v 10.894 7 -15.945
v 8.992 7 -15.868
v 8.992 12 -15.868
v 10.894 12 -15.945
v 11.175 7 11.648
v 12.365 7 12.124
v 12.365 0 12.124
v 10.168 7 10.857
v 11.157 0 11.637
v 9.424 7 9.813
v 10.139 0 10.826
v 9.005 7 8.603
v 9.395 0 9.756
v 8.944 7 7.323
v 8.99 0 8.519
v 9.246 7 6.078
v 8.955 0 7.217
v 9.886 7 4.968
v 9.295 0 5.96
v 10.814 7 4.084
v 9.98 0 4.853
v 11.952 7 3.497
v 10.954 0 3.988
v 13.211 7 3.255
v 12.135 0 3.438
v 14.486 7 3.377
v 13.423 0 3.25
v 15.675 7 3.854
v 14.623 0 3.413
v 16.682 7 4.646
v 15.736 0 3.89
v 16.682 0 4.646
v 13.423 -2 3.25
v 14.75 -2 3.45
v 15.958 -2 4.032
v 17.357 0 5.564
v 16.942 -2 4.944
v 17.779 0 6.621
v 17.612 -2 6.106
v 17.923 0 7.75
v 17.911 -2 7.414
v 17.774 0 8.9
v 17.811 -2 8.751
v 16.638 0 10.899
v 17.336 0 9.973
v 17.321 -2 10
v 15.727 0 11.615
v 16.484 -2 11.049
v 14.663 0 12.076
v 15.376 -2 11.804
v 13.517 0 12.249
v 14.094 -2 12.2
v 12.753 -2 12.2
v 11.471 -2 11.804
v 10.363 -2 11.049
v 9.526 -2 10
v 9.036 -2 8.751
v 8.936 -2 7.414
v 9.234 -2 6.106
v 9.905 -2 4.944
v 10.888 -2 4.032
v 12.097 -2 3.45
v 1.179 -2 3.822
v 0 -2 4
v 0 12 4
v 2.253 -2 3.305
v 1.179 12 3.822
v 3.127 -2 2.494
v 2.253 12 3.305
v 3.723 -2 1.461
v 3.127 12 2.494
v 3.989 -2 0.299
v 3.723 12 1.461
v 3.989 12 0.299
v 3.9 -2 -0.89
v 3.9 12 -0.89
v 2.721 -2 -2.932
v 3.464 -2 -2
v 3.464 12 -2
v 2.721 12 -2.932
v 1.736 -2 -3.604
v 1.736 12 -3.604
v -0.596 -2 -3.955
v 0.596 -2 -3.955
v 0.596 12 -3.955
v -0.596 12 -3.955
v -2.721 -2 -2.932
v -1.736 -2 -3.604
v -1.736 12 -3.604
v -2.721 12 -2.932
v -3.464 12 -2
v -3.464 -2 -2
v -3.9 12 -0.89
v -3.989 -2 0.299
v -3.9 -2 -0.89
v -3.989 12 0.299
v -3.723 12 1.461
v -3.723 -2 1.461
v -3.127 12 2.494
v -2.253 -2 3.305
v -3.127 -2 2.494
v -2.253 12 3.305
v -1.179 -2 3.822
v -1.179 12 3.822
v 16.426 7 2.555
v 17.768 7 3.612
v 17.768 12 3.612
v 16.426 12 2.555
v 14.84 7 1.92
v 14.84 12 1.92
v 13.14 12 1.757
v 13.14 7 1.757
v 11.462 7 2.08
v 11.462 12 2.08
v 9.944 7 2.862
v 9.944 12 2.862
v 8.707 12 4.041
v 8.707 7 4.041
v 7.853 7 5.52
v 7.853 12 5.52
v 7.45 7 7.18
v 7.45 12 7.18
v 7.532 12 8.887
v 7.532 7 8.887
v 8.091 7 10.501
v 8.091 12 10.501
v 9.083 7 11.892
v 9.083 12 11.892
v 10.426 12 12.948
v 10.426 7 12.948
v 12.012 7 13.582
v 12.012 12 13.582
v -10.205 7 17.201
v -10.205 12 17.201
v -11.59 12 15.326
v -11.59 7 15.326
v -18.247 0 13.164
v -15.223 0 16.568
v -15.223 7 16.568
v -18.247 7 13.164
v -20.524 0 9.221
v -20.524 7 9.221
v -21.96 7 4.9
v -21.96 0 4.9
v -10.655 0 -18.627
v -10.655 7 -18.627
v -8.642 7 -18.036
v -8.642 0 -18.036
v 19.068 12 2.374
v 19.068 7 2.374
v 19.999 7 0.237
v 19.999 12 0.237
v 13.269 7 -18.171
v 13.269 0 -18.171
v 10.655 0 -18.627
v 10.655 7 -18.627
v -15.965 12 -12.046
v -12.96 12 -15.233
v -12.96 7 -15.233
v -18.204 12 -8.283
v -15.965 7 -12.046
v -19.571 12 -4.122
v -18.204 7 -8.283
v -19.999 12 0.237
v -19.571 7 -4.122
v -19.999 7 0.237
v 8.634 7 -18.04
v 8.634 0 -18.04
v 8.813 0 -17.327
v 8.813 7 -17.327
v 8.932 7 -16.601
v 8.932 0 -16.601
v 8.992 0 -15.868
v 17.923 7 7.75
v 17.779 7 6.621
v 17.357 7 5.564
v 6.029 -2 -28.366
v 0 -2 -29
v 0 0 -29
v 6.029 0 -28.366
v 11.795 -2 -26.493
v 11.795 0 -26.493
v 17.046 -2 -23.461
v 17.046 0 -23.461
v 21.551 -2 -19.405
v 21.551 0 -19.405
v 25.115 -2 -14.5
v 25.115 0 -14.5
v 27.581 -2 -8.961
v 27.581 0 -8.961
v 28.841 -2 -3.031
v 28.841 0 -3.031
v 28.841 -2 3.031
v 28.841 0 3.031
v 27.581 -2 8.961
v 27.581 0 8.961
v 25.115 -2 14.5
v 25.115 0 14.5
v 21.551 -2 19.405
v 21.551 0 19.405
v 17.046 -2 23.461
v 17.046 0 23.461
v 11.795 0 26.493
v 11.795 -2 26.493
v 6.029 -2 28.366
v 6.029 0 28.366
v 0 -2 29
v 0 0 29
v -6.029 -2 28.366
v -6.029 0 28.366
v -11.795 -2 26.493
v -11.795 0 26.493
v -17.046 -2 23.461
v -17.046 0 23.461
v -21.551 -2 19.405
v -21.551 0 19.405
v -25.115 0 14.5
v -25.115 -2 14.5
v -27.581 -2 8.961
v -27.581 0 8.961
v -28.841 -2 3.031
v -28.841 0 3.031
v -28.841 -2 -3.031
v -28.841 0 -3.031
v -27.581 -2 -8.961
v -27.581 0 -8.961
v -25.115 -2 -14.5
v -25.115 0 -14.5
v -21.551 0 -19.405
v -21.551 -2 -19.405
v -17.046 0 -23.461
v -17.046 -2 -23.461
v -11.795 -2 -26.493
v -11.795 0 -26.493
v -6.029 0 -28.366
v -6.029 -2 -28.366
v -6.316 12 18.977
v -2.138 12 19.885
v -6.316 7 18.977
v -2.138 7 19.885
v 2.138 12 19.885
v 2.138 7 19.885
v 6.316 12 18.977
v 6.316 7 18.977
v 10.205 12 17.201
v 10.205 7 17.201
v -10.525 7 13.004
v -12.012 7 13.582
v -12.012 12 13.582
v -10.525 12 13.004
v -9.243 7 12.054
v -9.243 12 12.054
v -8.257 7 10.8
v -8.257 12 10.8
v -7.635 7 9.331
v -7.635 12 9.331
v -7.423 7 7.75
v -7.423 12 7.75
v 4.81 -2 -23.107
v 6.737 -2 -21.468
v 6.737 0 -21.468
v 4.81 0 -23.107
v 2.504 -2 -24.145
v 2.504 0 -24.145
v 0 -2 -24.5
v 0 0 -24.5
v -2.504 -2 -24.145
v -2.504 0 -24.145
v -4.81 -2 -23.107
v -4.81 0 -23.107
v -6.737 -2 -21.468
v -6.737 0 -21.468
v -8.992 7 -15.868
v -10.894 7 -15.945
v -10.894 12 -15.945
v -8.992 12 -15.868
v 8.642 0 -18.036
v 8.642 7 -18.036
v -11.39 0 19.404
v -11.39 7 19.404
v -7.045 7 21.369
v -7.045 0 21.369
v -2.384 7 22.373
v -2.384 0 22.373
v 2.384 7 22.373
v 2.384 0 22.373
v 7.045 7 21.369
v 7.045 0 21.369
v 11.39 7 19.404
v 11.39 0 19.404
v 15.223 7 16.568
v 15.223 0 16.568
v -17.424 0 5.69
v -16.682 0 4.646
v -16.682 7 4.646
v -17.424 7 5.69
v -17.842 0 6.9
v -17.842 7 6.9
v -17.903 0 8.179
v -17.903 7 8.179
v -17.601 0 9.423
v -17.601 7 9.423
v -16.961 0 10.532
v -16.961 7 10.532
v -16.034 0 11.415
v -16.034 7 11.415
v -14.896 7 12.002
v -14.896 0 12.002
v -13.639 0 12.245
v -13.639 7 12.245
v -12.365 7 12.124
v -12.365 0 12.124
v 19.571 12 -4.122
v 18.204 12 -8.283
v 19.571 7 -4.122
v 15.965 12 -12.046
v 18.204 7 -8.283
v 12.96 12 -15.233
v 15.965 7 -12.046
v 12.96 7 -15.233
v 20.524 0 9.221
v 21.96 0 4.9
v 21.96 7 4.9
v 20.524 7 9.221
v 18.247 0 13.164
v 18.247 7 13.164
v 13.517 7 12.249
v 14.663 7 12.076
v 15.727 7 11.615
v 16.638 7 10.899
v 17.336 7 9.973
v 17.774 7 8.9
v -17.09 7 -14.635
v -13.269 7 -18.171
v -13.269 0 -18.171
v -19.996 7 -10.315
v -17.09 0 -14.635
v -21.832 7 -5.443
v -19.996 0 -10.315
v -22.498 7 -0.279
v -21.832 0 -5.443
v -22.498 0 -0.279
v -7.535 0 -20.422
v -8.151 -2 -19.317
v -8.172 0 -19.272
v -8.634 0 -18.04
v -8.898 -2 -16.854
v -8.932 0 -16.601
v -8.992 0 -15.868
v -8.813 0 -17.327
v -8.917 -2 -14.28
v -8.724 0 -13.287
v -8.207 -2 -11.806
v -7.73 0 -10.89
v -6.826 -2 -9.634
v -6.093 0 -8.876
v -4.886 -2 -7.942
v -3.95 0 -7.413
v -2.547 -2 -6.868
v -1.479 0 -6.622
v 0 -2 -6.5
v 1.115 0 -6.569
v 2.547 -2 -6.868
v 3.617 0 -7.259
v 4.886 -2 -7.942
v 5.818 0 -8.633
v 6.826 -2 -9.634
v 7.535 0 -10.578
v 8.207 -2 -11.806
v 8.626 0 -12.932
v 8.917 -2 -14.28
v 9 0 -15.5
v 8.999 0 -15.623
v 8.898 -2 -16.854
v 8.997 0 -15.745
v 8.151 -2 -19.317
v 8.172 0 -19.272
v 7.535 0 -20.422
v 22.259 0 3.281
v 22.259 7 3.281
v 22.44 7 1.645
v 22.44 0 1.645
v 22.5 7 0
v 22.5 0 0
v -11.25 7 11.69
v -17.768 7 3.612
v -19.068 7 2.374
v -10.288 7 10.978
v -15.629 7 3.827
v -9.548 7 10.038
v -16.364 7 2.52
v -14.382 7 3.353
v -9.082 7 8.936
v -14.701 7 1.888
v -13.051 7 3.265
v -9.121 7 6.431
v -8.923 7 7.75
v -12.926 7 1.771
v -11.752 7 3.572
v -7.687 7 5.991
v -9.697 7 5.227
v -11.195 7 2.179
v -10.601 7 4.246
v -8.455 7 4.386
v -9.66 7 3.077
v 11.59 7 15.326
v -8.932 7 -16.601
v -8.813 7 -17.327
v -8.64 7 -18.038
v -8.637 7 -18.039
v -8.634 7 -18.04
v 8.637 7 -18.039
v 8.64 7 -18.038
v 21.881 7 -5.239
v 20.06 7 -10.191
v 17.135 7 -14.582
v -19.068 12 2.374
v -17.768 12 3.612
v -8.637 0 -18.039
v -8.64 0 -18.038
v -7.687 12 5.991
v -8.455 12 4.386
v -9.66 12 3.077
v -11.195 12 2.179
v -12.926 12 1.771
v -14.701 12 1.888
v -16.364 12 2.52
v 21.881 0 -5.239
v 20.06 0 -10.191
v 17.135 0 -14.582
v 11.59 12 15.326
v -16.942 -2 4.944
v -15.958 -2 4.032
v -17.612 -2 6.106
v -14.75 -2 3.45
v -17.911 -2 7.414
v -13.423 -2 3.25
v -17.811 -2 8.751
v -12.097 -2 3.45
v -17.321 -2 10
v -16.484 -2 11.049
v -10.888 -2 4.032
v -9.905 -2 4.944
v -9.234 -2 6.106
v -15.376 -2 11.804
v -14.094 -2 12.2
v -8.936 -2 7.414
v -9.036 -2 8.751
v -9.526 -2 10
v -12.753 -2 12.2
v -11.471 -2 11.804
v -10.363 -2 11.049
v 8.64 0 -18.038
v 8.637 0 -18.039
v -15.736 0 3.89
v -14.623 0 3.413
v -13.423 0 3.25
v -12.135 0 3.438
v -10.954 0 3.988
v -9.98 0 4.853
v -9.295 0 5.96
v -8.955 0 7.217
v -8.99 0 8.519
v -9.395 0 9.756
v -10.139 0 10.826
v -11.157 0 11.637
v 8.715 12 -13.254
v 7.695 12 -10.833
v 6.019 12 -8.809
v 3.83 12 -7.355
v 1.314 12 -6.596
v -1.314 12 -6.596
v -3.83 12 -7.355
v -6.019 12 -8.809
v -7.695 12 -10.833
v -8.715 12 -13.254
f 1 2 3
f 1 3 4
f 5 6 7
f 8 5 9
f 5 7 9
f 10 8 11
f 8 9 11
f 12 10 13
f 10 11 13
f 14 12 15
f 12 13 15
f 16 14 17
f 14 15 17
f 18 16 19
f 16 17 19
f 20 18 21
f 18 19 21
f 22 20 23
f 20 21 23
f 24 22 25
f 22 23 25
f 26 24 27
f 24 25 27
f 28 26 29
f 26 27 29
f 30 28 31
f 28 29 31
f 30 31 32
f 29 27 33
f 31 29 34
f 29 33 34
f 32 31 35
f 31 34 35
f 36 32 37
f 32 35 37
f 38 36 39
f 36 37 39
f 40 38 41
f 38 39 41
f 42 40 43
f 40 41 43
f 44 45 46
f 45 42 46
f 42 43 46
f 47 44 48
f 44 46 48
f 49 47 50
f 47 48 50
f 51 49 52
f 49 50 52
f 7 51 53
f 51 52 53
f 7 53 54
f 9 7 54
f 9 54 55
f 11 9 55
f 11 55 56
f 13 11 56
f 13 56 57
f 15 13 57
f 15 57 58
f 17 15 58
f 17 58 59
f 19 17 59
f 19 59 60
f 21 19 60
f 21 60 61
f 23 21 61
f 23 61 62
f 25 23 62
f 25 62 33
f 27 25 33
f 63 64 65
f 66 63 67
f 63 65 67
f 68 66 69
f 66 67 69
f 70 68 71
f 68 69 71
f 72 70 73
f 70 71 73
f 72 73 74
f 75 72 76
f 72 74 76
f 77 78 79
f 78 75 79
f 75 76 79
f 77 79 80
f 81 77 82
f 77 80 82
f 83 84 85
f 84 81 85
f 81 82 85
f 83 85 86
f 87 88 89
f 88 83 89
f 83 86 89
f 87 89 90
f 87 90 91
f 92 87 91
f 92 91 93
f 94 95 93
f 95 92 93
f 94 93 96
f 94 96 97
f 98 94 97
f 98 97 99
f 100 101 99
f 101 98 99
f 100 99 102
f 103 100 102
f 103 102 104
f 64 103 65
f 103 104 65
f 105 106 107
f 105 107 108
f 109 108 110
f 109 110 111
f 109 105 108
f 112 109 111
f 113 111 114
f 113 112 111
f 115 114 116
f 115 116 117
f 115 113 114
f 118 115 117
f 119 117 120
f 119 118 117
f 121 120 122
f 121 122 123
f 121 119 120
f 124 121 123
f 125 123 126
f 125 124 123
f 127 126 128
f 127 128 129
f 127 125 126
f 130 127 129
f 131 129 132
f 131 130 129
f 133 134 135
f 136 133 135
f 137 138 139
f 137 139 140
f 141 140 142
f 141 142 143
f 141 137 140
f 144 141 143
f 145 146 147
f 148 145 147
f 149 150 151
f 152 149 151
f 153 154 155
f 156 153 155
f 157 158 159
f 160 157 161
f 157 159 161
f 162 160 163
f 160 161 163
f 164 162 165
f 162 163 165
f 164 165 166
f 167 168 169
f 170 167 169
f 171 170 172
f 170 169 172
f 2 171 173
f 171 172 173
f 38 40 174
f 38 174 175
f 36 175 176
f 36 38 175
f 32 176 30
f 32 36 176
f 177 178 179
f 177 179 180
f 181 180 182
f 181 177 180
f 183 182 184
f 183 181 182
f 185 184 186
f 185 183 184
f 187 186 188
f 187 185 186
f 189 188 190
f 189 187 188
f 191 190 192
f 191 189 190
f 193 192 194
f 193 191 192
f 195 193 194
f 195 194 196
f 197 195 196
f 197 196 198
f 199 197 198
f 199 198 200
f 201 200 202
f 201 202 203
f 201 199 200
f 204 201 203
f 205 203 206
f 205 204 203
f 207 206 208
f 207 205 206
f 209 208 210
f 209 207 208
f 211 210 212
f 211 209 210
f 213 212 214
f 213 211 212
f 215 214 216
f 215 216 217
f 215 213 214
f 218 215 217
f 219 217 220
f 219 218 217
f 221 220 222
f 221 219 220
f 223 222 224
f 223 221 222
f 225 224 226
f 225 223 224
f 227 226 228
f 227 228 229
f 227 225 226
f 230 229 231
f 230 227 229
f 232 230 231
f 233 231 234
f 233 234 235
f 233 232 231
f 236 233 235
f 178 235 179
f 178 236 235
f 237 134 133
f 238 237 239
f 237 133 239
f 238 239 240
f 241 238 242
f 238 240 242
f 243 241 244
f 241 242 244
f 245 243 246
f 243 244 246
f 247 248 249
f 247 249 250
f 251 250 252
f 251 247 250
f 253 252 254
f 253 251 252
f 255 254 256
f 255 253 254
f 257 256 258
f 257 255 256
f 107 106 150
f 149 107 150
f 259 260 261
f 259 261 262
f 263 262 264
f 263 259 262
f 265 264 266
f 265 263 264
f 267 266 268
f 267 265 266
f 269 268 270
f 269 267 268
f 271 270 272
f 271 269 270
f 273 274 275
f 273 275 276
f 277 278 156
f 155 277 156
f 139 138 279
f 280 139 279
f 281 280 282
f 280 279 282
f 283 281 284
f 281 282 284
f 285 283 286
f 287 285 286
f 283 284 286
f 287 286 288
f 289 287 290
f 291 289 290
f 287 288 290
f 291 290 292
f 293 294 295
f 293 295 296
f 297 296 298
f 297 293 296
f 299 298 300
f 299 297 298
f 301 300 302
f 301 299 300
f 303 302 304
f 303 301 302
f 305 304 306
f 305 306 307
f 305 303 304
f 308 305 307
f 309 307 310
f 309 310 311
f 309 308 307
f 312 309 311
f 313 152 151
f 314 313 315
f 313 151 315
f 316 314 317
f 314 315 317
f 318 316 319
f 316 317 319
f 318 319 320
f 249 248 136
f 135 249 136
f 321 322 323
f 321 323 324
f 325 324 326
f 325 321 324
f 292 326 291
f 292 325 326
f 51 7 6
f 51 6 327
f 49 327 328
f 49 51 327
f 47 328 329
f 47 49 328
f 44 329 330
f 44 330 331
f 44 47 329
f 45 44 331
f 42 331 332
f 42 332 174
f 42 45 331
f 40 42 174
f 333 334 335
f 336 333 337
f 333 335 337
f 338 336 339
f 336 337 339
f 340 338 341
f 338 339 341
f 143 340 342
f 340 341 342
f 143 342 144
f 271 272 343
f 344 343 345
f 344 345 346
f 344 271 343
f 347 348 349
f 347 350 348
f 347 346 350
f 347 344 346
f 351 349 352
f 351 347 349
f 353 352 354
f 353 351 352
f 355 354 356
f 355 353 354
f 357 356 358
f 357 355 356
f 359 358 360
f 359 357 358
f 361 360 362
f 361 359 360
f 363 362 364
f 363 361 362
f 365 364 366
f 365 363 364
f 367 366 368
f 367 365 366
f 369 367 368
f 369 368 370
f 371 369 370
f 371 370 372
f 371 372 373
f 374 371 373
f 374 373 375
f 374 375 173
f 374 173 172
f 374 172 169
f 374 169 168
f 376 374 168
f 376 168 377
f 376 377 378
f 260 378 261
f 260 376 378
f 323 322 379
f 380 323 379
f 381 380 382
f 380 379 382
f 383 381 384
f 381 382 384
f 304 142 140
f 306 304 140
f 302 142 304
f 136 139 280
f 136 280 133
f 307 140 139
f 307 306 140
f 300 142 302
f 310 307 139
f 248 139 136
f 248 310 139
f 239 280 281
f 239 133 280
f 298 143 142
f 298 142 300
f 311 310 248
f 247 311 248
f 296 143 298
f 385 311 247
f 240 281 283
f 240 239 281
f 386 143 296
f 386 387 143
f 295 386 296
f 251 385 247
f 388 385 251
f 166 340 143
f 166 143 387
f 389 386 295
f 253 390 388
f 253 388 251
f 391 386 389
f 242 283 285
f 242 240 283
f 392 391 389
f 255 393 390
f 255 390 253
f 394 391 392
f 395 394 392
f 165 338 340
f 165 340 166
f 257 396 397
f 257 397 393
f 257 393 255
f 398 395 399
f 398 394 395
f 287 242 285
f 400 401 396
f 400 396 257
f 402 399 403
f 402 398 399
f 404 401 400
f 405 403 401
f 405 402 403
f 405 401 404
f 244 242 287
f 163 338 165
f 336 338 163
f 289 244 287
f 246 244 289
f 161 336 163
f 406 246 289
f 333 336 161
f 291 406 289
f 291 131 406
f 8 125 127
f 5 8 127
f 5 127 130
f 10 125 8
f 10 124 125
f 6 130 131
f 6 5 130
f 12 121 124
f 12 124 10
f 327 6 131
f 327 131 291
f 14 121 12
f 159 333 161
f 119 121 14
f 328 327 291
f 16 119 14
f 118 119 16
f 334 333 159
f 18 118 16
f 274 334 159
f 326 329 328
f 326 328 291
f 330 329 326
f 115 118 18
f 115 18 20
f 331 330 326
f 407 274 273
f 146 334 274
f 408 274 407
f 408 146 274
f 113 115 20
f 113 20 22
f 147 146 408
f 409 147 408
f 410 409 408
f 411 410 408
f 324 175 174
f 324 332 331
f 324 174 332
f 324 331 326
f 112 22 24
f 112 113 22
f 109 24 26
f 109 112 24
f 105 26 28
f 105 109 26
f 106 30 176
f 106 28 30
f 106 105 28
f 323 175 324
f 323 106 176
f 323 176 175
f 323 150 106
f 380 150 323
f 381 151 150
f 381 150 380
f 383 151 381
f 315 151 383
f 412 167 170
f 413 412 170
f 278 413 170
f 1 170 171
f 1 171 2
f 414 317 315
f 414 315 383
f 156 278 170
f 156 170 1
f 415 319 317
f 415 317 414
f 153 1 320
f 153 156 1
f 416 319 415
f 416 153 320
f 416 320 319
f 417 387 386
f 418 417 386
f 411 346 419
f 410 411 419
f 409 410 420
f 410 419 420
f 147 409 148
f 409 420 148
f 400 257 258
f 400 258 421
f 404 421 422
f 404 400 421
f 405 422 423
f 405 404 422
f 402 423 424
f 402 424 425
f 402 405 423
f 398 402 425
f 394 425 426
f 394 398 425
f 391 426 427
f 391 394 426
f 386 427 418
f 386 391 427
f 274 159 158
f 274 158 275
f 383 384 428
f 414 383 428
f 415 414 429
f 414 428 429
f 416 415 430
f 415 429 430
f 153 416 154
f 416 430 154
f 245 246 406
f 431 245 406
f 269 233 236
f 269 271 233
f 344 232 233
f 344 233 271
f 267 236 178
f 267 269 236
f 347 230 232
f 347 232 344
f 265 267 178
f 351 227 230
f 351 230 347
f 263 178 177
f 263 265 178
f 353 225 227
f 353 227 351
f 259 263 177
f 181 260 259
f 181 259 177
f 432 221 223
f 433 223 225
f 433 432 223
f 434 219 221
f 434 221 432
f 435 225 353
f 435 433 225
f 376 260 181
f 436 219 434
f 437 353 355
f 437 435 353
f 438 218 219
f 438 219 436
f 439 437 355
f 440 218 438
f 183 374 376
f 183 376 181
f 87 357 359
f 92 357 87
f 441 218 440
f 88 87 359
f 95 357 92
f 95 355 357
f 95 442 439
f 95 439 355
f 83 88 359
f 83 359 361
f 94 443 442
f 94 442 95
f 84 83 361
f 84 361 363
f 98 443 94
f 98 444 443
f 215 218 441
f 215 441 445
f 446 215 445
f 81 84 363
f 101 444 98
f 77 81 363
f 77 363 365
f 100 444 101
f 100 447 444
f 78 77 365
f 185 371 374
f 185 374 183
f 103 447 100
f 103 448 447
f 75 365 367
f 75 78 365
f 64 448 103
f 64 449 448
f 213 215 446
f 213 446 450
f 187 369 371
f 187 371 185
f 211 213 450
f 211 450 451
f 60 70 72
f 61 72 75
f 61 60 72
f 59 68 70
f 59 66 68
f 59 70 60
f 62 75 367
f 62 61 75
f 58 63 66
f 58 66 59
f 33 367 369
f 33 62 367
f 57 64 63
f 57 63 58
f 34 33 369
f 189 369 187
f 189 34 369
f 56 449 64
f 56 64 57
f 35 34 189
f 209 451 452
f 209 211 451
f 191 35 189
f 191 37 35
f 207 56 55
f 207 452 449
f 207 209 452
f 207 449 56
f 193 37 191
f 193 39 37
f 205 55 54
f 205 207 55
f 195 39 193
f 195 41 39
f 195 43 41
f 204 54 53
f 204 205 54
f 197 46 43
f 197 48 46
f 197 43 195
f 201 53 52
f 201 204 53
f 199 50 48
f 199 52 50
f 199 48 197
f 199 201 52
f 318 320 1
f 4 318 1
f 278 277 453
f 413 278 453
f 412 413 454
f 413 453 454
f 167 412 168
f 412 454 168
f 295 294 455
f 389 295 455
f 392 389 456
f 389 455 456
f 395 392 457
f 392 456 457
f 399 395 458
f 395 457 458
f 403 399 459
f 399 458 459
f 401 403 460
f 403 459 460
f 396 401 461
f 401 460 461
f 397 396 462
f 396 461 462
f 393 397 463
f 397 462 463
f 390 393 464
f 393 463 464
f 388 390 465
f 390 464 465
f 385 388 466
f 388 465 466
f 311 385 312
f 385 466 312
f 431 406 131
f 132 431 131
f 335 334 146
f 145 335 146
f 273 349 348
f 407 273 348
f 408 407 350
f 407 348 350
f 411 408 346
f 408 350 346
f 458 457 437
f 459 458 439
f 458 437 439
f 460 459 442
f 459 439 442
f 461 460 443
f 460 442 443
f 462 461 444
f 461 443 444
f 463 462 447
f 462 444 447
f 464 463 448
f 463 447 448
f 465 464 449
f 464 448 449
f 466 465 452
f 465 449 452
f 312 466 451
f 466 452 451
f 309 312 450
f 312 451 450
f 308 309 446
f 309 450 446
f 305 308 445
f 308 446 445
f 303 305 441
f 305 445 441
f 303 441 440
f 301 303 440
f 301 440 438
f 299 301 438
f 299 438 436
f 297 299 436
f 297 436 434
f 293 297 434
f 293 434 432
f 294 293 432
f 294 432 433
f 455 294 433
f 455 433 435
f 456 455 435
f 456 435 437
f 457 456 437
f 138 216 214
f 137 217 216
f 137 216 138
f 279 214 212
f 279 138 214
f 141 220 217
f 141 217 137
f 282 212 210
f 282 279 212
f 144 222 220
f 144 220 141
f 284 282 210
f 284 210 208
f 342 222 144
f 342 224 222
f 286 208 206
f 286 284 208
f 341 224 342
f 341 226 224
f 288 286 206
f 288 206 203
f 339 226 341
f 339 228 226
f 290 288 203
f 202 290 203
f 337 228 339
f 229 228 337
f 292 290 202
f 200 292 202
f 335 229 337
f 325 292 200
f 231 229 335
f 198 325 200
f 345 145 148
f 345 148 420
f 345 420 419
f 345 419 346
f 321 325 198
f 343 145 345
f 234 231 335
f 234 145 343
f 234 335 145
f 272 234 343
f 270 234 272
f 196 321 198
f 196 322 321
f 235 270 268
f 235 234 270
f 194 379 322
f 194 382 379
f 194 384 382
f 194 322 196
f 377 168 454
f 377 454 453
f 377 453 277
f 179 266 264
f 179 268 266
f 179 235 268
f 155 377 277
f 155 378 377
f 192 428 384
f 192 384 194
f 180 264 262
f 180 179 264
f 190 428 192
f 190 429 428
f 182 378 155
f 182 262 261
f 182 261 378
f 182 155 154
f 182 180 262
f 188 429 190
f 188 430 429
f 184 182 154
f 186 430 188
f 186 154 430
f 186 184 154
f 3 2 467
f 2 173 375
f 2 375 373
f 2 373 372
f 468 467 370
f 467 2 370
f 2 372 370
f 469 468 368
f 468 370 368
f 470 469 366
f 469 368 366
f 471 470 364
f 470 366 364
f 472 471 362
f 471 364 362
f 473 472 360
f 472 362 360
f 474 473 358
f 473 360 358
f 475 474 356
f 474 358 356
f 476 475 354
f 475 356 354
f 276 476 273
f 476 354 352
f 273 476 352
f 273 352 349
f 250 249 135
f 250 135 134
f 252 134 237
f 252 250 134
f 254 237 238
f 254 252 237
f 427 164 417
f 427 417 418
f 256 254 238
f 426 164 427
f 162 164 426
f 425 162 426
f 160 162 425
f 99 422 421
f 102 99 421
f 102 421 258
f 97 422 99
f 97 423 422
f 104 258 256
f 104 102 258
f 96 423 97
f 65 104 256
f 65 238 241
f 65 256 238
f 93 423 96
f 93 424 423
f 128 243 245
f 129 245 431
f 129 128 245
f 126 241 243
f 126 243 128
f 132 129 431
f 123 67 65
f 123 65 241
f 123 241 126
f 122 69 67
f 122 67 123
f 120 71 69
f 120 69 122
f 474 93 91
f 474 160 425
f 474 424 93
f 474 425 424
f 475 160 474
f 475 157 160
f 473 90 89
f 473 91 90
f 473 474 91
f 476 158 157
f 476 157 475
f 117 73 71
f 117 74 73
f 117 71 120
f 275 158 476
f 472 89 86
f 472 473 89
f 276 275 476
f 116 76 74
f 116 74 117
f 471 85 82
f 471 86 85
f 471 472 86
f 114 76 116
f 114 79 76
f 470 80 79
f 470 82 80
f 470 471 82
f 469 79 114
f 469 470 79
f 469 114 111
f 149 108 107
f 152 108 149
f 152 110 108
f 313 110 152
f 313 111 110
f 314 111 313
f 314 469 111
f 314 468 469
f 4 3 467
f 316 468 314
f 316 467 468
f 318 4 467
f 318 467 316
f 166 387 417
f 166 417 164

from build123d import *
from build123d.topology import SkipClean

# Parameters (mm, degrees)
BOSS_EXTRUDE1_DEPTH      = 7
BOSS_EXTRUDE3_DEPTH      = 5
BOSS_EXTRUDE3_DEPTH_BACK = 7
BOSS_EXTRUDE5_DEPTH      = 7
CUT_EXTRUDE1_START       = -5
CUT_EXTRUDE1_DEPTH       = 5
SKETCH5_R                = 4
CUT_EXTRUDE2_DEPTH       = 35.007352146
BOSS_EXTRUDE7_START      = 2
SKETCH6_R                = 29
SKETCH6_R_2              = 4.5
SKETCH6_R_3              = 4
BOSS_EXTRUDE7_DEPTH      = 2
CUT_EXTRUDE6_START       = -12
CUT_EXTRUDE6_DEPTH       = 12
BOSS_EXTRUDE8_DEPTH      = 7


with BuildPart() as part:
    # Sketch1 → Boss-Extrude1 (new body)
    with BuildSketch(Plane(origin=(0, 0, 0), x_dir=(1, 0, 0), z_dir=(0, 1, 0))):
        with BuildLine():
            ThreePointArc((21.960068583, -4.899529347), (22.364609801, -2.464594985), (22.5, 0))
            ThreePointArc((22.5, 0), (18.136022741, 13.316706768), (6.73691741, 21.467741935))
            ThreePointArc((6.73691741, 21.467741935), (8.415231925, 18.691217895), (9, 15.5))
            ThreePointArc((9, 15.5), (-3.191217895, 7.084768075), (-6.73691741, 21.467741935))
            ThreePointArc((-6.73691741, 21.467741935), (-19.485571585, 11.25), (-21.960068583, -4.899529347))
            ThreePointArc((-21.960068583, -4.899529347), (-11.979453563, 1.133413573), (-4.423393759, -7.75))
            ThreePointArc((-4.423393759, -7.75), (-7.731198081, -14.721291729), (-15.223151173, -16.568212588))
            ThreePointArc((-15.223151173, -16.568212588), (0, -22.5), (15.223151173, -16.568212588))
            ThreePointArc((15.223151173, -16.568212588), (5.629165125, -3.25), (21.960068583, -4.899529347))
        make_face()
    extrude(amount=BOSS_EXTRUDE1_DEPTH)

    # Sketch2 → Boss-Extrude3 (add, two sides: drawn at the far end of the back side and taken through both)
    with BuildSketch(Plane(origin=(0, 7, 0), x_dir=(1, 0, 0), z_dir=(0, 1, 0)).offset(-BOSS_EXTRUDE3_DEPTH_BACK)):
        with BuildLine():
            ThreePointArc((-11.306354333, -16.497465008), (0, -20), (11.306354333, -16.497465008))
            Line((11.306354333, -16.497465008), (12.364874046, -12.123732504))
            ThreePointArc((12.364874046, -12.123732504), (9.526279442, -5.5), (16.68189736, -4.646428786))
            Line((16.68189736, -4.646428786), (19.940400962, -1.542857572))
            ThreePointArc((19.940400962, -1.542857572), (17.320508076, 10), (8.634046629, 18.040322581))
            ThreePointArc((8.634046629, 18.040322581), (0, 6.5), (-8.634046629, 18.040322581))
            ThreePointArc((-8.634046629, 18.040322581), (-17.320508076, 10), (-19.940400962, -1.542857572))
            Line((-19.940400962, -1.542857572), (-16.68189736, -4.646428786))
            ThreePointArc((-16.68189736, -4.646428786), (-9.526279442, -5.5), (-12.364874046, -12.123732504))
            Line((-12.364874046, -12.123732504), (-11.306354333, -16.497465008))
        make_face()
    extrude(amount=BOSS_EXTRUDE3_DEPTH + BOSS_EXTRUDE3_DEPTH_BACK)

    # Sketch3 → Boss-Extrude5 (add)
    with SkipClean():  # the faces are left unmerged after this step: merging them gives an invalid solid
        with BuildSketch(Plane.XZ):
            with BuildLine():
                ThreePointArc((-11.306354333, 16.497465008), (-13.260856767, 16.748532198), (-15.223151173, 16.568212588))
                ThreePointArc((-15.223151173, 16.568212588), (-19.485571585, 11.25), (-21.960068583, 4.899529347))
                ThreePointArc((-21.960068583, 4.899529347), (-21.135082743, 3.109972737), (-19.940400962, 1.542857572))
                Line((-19.940400962, 1.542857572), (-16.68189736, 4.646428786))
                ThreePointArc((-16.68189736, 4.646428786), (-17.320508076, 10), (-12.364874046, 12.123732504))
                Line((-12.364874046, 12.123732504), (-11.306354333, 16.497465008))
            make_face()
            with BuildLine():
                ThreePointArc((-19.940400962, 1.542857572), (-5.629165125, 3.25), (-11.306354333, 16.497465008))
                Line((-11.306354333, 16.497465008), (-12.364874046, 12.123732504))
                ThreePointArc((-12.364874046, 12.123732504), (-9.886916789, 10.532684072), (-8.923393759, 7.75))
                ThreePointArc((-8.923393759, 7.75), (-11.7520569, 3.571886418), (-16.68189736, 4.646428786))
                Line((-16.68189736, 4.646428786), (-19.940400962, 1.542857572))
            make_face()
            with BuildLine():
                Line((16.68189736, 4.646428786), (19.940400962, 1.542857572))
                ThreePointArc((19.940400962, 1.542857572), (21.135082743, 3.109972737), (21.960068583, 4.899529347))
                ThreePointArc((21.960068583, 4.899529347), (19.485571585, 11.25), (15.223151173, 16.568212588))
                ThreePointArc((15.223151173, 16.568212588), (13.260856767, 16.748532198), (11.306354333, 16.497465008))
                Line((11.306354333, 16.497465008), (12.364874046, 12.123732504))
                ThreePointArc((12.364874046, 12.123732504), (16.206077831, 11.286476969), (17.923393759, 7.75))
                ThreePointArc((17.923393759, 7.75), (17.601507341, 6.078663141), (16.68189736, 4.646428786))
            make_face()
            with BuildLine():
                ThreePointArc((11.306354333, 16.497465008), (5.629165125, 3.25), (19.940400962, 1.542857572))
                Line((19.940400962, 1.542857572), (16.68189736, 4.646428786))
                ThreePointArc((16.68189736, 4.646428786), (9.526279442, 5.5), (12.364874046, 12.123732504))
                Line((12.364874046, 12.123732504), (11.306354333, 16.497465008))
            make_face()
        extrude(amount=-BOSS_EXTRUDE5_DEPTH)

    # Sketch4 → Cut-Extrude1 (cut)
    with SkipClean():  # the faces are left unmerged after this step: merging them gives an invalid solid
        with BuildSketch(Plane(origin=(0, 12, 0), x_dir=(1, 0, 0), z_dir=(0, 1, 0)).offset(CUT_EXTRUDE1_START)):
            with BuildLine():
                ThreePointArc((-17.768065227, -3.611905048), (-18.619546181, -10.75), (-12.012034142, -13.581643339))
                Line((-12.012034142, -13.581643339), (-12.364874046, -12.123732504))
                ThreePointArc((-12.364874046, -12.123732504), (-9.526279442, -5.5), (-16.68189736, -4.646428786))
                Line((-16.68189736, -4.646428786), (-17.768065227, -3.611905048))
            make_face()
            with BuildLine():
                Line((-12.364874046, -12.123732504), (-12.012034142, -13.581643339))
                ThreePointArc((-12.012034142, -13.581643339), (-8.708091133, -11.46024543), (-7.423393759, -7.75))
                ThreePointArc((-7.423393759, -7.75), (-11.194944613, -2.179181891), (-17.768065227, -3.611905048))
                Line((-17.768065227, -3.611905048), (-16.68189736, -4.646428786))
                ThreePointArc((-16.68189736, -4.646428786), (-9.526279442, -5.5), (-12.364874046, -12.123732504))
            make_face()
            with BuildLine():
                ThreePointArc((12.364874046, -12.123732504), (9.526279442, -5.5), (16.68189736, -4.646428786))
                Line((16.68189736, -4.646428786), (17.768065227, -3.611905048))
                ThreePointArc((17.768065227, -3.611905048), (8.227241336, -4.75), (12.012034142, -13.581643339))
                Line((12.012034142, -13.581643339), (12.364874046, -12.123732504))
            make_face()
            with BuildLine():
                Line((17.768065227, -3.611905048), (16.68189736, -4.646428786))
                ThreePointArc((16.68189736, -4.646428786), (9.526279442, -5.5), (12.364874046, -12.123732504))
                Line((12.364874046, -12.123732504), (12.012034142, -13.581643339))
                ThreePointArc((12.012034142, -13.581643339), (17.133639188, -12.465302626), (19.423393759, -7.75))
                ThreePointArc((19.423393759, -7.75), (18.994211868, -5.521550855), (17.768065227, -3.611905048))
            make_face()
        extrude(amount=CUT_EXTRUDE1_DEPTH, mode=Mode.SUBTRACT)

    # Sketch5 → Cut-Extrude2 (cut, through all)
    with SkipClean():  # the faces are left unmerged after this step: merging them gives an invalid solid
        with BuildSketch(Plane(origin=(0, 12, 0), x_dir=(1, 0, 0), z_dir=(0, 1, 0))):
            with Locations(Location((0, 0, 0), (0, 0, 270))):
                Circle(SKETCH5_R)
        extrude(amount=-CUT_EXTRUDE2_DEPTH, mode=Mode.SUBTRACT)

    # Sketch6 → Boss-Extrude7 (add)
    # profile 1 of 2: a face of its own
    with SkipClean():  # the faces are left unmerged after this step: merging them gives an invalid solid
        with BuildSketch(Plane.XZ.offset(BOSS_EXTRUDE7_START)):
            with Locations(Location((0, 0, 0), (0, 0, 270))):
                Circle(SKETCH6_R)
            with BuildLine():
                ThreePointArc((6.73691741, -21.467741935), (0, -24.5), (-6.73691741, -21.467741935))
                ThreePointArc((-6.73691741, -21.467741935), (0, 22.5), (6.73691741, -21.467741935))
            make_face(mode=Mode.SUBTRACT)
        # profile 2 of 2: a face of its own
        with BuildSketch(Plane.XZ.offset(BOSS_EXTRUDE7_START)):
            with BuildLine():
                ThreePointArc((6.73691741, -21.467741935), (0, 22.5), (-6.73691741, -21.467741935))
                ThreePointArc((-6.73691741, -21.467741935), (0, -6.5), (6.73691741, -21.467741935))
            make_face()
            with Locations(Location((-13.423393759, 7.75, 0), (0, 0, 270))):
                Circle(SKETCH6_R_2, mode=Mode.SUBTRACT)
            with Locations(Location((13.423393759, 7.75, 0), (0, 0, 270))):
                Circle(SKETCH6_R_2, mode=Mode.SUBTRACT)
            with Locations(Location((0, 0, 0), (0, 0, 90))):
                Circle(SKETCH6_R_3, mode=Mode.SUBTRACT)
        extrude(amount=-BOSS_EXTRUDE7_DEPTH)

    # Sketch7 → Cut-Extrude6 (cut)
    with SkipClean():  # the faces are left unmerged after this step: merging them gives an invalid solid
        with BuildSketch(Plane(origin=(0, 12, 0), x_dir=(1, 0, 0), z_dir=(0, 1, 0)).offset(CUT_EXTRUDE6_START)):
            with BuildLine():
                ThreePointArc((8.634046629, 18.040322581), (8.638200135, 18.038334137), (8.642353183, 18.036344737))
                Line((8.642353183, 18.036344737), (12.012034142, 19.025273606))
                ThreePointArc((12.012034142, 19.025273606), (9.453687585, 20.417585338), (6.73691741, 21.467741935))
                ThreePointArc((6.73691741, 21.467741935), (7.874225977, 19.858504935), (8.634046629, 18.040322581))
            make_face()
            with BuildLine():
                ThreePointArc((8.634046629, 18.040322581), (8.634914915, 18.037369585), (8.635782192, 18.034416292))
                Line((8.635782192, 18.034416292), (8.642353183, 18.036344737))
                ThreePointArc((8.642353183, 18.036344737), (8.638200135, 18.038334137), (8.634046629, 18.040322581))
            make_face()
            with BuildLine():
                Line((8.642353183, 18.036344737), (8.635782192, 18.034416292))
                ThreePointArc((8.635782192, 18.034416292), (8.880475096, 16.961903579), (8.992491714, 15.8675497))
                Line((8.992491714, 15.8675497), (12.012034142, 15.990967319))
                ThreePointArc((12.012034142, 15.990967319), (10.377707894, 17.09687629), (8.642353183, 18.036344737))
            make_face()
            with BuildLine():
                ThreePointArc((-6.73691741, 21.467741935), (-9.453687585, 20.417585338), (-12.012034142, 19.025273606))
                Line((-12.012034142, 19.025273606), (-8.642353183, 18.036344737))
                ThreePointArc((-8.642353183, 18.036344737), (-8.638200135, 18.038334137), (-8.634046629, 18.040322581))
                ThreePointArc((-8.634046629, 18.040322581), (-7.874225977, 19.858504935), (-6.73691741, 21.467741935))
            make_face()
            with BuildLine():
                Line((-12.012034142, 15.990967319), (-8.992491714, 15.8675497))
                ThreePointArc((-8.992491714, 15.8675497), (-8.880475096, 16.961903579), (-8.635782192, 18.034416292))
                Line((-8.635782192, 18.034416292), (-8.642353183, 18.036344737))
                ThreePointArc((-8.642353183, 18.036344737), (-10.377707894, 17.09687629), (-12.012034142, 15.990967319))
            make_face()
            with BuildLine():
                Line((-8.642353183, 18.036344737), (-8.635782192, 18.034416292))
                ThreePointArc((-8.635782192, 18.034416292), (-8.634914915, 18.037369585), (-8.634046629, 18.040322581))
                ThreePointArc((-8.634046629, 18.040322581), (-8.638200135, 18.038334137), (-8.642353183, 18.036344737))
            make_face()
        extrude(amount=CUT_EXTRUDE6_DEPTH, mode=Mode.SUBTRACT)

    # Sketch8 → Boss-Extrude8 (add)
    with SkipClean():  # the faces are left unmerged after this step: merging them gives an invalid solid
        with BuildSketch(Plane(origin=(0, 0, 0), x_dir=(1, 0, 0), z_dir=(0, 1, 0))):
            with BuildLine():
                Line((-12.012034142, 15.990967319), (-8.992491714, 15.8675497))
                ThreePointArc((-8.992491714, 15.8675497), (-8.879974605, 16.96494062), (-8.634046629, 18.040322581))
                ThreePointArc((-8.634046629, 18.040322581), (-10.37377111, 17.099265275), (-12.012034142, 15.990967319))
            make_face()
            with BuildLine():
                Line((8.992491714, 15.8675497), (12.012034142, 15.990967319))
                ThreePointArc((12.012034142, 15.990967319), (10.37377111, 17.099265275), (8.634046629, 18.040322581))
                ThreePointArc((8.634046629, 18.040322581), (8.879974605, 16.96494062), (8.992491714, 15.8675497))
            make_face()
        extrude(amount=BOSS_EXTRUDE8_DEPTH)

    # Fillet1
    # the kernel refuses this chamfer: 3 mm, written as the material it takes off along each edge
    with BuildSketch(Plane(origin=(12.012034142, 7, -15.990967319), x_dir=(0.7995517704478904, 0, 0.6005971747965888), z_dir=(0, 1, 0))) as fillet1_piece_1:
        with BuildLine():
            Line((1.213528757, -0.036857141), (-0.866764272, -0.70825745))
            Line((-0.866764272, -0.70825745), (0, 0))
            ThreePointArc((0, 0), (0.66349858, -0.011012552), (1.213528757, -0.036857141))
        make_face()
    extrude(amount=8.319320921, mode=Mode.SUBTRACT)
    with BuildSketch(Plane(origin=(12.012034142, 0, -19.025273606), x_dir=(0.8437207298406628, 0, 0.5367823861092493), z_dir=(0, 1, 0))) as fillet1_piece_2:
        with BuildLine():
            Line((1.518754527, -0.046065538), (-0.931353915, -1.064652801))
            Line((-0.931353915, -1.064652801), (0, 0))
            ThreePointArc((0, 0), (0.814389338, -0.011931871), (1.518754527, -0.046065538))
        make_face()
    extrude(amount=11.073901279, mode=Mode.SUBTRACT)
    with BuildSketch(Plane(origin=(-12.012034142, 7, -15.990967319), x_dir=(-0.799551770447954, 0, 0.6005971747965038), z_dir=(0, 1, 0))) as fillet1_piece_3:
        with BuildLine():
            Line((1.213528757, 0.036857141), (-0.866764272, 0.70825745))
            Line((-0.866764272, 0.70825745), (0, 0))
            ThreePointArc((0, 0), (0.66349858, 0.011012552), (1.213528757, 0.036857141))
        make_face()
    extrude(amount=8.319320921, mode=Mode.SUBTRACT)
    with BuildSketch(Plane(origin=(-12.012034142, 0, -19.025273606), x_dir=(-0.843720729840673, 0, 0.5367823861092332), z_dir=(0, 1, 0))) as fillet1_piece_4:
        with BuildLine():
            Line((1.518754527, 0.046065538), (-0.931353915, 1.064652801))
            Line((-0.931353915, 1.064652801), (0, 0))
            ThreePointArc((0, 0), (0.814389338, 0.011931871), (1.518754527, 0.046065538))
        make_face()
    extrude(amount=11.073901279, mode=Mode.SUBTRACT)
    with BuildSketch(Plane(origin=(19.940400962, 7, 1.542857572), x_dir=(-0.6992361724703339, 0, 0.7148907434769579), z_dir=(0, 1, 0))) as fillet1_piece_5:
        with BuildLine():
            Line((1.204235817, -0.042668697), (-0.974123895, -0.87139156))
            ThreePointArc((-0.974123895, -0.87139156), (-0.535859817, -0.465123865), (0, 0))
            Line((0, 0), (1.204235817, -0.042668697))
        make_face()
    extrude(amount=8.549220137, mode=Mode.SUBTRACT)
    with BuildSketch(Plane(origin=(11.306354333, 7, 16.497465008), x_dir=(-0.826230478481032, 0, 0.5633322256262328), z_dir=(0, 1, 0)), Plane(origin=(-11.306354333, 15.549220137, 16.497465008), x_dir=(0.8262304784811115, 0, 0.5633322256261161), z_dir=(0, -1, 0))) as fillet1_piece_6:
        with BuildLine():
            Line((1.306397829, -0.039564186), (-0.893955271, -0.807990405))
            Line((-0.893955271, -0.807990405), (0, 0))
            ThreePointArc((0, 0), (0.70948401, -0.01088084), (1.306397829, -0.039564186))
        make_face()
    extrude(amount=8.549220137, mode=Mode.SUBTRACT)
    with BuildSketch(Plane(origin=(-19.940400962, 7, 1.542857572), x_dir=(0.6992361724705505, 0, 0.7148907434767461), z_dir=(0, 1, 0))) as fillet1_piece_7:
        with BuildLine():
            Line((1.204235817, 0.042668697), (-0.974123895, 0.87139156))
            ThreePointArc((-0.974123895, 0.87139156), (-0.535859817, 0.465123865), (0, 0))
            Line((0, 0), (1.204235817, 0.042668697))
        make_face()
    extrude(amount=8.549220137, mode=Mode.SUBTRACT)


solid = part.part
